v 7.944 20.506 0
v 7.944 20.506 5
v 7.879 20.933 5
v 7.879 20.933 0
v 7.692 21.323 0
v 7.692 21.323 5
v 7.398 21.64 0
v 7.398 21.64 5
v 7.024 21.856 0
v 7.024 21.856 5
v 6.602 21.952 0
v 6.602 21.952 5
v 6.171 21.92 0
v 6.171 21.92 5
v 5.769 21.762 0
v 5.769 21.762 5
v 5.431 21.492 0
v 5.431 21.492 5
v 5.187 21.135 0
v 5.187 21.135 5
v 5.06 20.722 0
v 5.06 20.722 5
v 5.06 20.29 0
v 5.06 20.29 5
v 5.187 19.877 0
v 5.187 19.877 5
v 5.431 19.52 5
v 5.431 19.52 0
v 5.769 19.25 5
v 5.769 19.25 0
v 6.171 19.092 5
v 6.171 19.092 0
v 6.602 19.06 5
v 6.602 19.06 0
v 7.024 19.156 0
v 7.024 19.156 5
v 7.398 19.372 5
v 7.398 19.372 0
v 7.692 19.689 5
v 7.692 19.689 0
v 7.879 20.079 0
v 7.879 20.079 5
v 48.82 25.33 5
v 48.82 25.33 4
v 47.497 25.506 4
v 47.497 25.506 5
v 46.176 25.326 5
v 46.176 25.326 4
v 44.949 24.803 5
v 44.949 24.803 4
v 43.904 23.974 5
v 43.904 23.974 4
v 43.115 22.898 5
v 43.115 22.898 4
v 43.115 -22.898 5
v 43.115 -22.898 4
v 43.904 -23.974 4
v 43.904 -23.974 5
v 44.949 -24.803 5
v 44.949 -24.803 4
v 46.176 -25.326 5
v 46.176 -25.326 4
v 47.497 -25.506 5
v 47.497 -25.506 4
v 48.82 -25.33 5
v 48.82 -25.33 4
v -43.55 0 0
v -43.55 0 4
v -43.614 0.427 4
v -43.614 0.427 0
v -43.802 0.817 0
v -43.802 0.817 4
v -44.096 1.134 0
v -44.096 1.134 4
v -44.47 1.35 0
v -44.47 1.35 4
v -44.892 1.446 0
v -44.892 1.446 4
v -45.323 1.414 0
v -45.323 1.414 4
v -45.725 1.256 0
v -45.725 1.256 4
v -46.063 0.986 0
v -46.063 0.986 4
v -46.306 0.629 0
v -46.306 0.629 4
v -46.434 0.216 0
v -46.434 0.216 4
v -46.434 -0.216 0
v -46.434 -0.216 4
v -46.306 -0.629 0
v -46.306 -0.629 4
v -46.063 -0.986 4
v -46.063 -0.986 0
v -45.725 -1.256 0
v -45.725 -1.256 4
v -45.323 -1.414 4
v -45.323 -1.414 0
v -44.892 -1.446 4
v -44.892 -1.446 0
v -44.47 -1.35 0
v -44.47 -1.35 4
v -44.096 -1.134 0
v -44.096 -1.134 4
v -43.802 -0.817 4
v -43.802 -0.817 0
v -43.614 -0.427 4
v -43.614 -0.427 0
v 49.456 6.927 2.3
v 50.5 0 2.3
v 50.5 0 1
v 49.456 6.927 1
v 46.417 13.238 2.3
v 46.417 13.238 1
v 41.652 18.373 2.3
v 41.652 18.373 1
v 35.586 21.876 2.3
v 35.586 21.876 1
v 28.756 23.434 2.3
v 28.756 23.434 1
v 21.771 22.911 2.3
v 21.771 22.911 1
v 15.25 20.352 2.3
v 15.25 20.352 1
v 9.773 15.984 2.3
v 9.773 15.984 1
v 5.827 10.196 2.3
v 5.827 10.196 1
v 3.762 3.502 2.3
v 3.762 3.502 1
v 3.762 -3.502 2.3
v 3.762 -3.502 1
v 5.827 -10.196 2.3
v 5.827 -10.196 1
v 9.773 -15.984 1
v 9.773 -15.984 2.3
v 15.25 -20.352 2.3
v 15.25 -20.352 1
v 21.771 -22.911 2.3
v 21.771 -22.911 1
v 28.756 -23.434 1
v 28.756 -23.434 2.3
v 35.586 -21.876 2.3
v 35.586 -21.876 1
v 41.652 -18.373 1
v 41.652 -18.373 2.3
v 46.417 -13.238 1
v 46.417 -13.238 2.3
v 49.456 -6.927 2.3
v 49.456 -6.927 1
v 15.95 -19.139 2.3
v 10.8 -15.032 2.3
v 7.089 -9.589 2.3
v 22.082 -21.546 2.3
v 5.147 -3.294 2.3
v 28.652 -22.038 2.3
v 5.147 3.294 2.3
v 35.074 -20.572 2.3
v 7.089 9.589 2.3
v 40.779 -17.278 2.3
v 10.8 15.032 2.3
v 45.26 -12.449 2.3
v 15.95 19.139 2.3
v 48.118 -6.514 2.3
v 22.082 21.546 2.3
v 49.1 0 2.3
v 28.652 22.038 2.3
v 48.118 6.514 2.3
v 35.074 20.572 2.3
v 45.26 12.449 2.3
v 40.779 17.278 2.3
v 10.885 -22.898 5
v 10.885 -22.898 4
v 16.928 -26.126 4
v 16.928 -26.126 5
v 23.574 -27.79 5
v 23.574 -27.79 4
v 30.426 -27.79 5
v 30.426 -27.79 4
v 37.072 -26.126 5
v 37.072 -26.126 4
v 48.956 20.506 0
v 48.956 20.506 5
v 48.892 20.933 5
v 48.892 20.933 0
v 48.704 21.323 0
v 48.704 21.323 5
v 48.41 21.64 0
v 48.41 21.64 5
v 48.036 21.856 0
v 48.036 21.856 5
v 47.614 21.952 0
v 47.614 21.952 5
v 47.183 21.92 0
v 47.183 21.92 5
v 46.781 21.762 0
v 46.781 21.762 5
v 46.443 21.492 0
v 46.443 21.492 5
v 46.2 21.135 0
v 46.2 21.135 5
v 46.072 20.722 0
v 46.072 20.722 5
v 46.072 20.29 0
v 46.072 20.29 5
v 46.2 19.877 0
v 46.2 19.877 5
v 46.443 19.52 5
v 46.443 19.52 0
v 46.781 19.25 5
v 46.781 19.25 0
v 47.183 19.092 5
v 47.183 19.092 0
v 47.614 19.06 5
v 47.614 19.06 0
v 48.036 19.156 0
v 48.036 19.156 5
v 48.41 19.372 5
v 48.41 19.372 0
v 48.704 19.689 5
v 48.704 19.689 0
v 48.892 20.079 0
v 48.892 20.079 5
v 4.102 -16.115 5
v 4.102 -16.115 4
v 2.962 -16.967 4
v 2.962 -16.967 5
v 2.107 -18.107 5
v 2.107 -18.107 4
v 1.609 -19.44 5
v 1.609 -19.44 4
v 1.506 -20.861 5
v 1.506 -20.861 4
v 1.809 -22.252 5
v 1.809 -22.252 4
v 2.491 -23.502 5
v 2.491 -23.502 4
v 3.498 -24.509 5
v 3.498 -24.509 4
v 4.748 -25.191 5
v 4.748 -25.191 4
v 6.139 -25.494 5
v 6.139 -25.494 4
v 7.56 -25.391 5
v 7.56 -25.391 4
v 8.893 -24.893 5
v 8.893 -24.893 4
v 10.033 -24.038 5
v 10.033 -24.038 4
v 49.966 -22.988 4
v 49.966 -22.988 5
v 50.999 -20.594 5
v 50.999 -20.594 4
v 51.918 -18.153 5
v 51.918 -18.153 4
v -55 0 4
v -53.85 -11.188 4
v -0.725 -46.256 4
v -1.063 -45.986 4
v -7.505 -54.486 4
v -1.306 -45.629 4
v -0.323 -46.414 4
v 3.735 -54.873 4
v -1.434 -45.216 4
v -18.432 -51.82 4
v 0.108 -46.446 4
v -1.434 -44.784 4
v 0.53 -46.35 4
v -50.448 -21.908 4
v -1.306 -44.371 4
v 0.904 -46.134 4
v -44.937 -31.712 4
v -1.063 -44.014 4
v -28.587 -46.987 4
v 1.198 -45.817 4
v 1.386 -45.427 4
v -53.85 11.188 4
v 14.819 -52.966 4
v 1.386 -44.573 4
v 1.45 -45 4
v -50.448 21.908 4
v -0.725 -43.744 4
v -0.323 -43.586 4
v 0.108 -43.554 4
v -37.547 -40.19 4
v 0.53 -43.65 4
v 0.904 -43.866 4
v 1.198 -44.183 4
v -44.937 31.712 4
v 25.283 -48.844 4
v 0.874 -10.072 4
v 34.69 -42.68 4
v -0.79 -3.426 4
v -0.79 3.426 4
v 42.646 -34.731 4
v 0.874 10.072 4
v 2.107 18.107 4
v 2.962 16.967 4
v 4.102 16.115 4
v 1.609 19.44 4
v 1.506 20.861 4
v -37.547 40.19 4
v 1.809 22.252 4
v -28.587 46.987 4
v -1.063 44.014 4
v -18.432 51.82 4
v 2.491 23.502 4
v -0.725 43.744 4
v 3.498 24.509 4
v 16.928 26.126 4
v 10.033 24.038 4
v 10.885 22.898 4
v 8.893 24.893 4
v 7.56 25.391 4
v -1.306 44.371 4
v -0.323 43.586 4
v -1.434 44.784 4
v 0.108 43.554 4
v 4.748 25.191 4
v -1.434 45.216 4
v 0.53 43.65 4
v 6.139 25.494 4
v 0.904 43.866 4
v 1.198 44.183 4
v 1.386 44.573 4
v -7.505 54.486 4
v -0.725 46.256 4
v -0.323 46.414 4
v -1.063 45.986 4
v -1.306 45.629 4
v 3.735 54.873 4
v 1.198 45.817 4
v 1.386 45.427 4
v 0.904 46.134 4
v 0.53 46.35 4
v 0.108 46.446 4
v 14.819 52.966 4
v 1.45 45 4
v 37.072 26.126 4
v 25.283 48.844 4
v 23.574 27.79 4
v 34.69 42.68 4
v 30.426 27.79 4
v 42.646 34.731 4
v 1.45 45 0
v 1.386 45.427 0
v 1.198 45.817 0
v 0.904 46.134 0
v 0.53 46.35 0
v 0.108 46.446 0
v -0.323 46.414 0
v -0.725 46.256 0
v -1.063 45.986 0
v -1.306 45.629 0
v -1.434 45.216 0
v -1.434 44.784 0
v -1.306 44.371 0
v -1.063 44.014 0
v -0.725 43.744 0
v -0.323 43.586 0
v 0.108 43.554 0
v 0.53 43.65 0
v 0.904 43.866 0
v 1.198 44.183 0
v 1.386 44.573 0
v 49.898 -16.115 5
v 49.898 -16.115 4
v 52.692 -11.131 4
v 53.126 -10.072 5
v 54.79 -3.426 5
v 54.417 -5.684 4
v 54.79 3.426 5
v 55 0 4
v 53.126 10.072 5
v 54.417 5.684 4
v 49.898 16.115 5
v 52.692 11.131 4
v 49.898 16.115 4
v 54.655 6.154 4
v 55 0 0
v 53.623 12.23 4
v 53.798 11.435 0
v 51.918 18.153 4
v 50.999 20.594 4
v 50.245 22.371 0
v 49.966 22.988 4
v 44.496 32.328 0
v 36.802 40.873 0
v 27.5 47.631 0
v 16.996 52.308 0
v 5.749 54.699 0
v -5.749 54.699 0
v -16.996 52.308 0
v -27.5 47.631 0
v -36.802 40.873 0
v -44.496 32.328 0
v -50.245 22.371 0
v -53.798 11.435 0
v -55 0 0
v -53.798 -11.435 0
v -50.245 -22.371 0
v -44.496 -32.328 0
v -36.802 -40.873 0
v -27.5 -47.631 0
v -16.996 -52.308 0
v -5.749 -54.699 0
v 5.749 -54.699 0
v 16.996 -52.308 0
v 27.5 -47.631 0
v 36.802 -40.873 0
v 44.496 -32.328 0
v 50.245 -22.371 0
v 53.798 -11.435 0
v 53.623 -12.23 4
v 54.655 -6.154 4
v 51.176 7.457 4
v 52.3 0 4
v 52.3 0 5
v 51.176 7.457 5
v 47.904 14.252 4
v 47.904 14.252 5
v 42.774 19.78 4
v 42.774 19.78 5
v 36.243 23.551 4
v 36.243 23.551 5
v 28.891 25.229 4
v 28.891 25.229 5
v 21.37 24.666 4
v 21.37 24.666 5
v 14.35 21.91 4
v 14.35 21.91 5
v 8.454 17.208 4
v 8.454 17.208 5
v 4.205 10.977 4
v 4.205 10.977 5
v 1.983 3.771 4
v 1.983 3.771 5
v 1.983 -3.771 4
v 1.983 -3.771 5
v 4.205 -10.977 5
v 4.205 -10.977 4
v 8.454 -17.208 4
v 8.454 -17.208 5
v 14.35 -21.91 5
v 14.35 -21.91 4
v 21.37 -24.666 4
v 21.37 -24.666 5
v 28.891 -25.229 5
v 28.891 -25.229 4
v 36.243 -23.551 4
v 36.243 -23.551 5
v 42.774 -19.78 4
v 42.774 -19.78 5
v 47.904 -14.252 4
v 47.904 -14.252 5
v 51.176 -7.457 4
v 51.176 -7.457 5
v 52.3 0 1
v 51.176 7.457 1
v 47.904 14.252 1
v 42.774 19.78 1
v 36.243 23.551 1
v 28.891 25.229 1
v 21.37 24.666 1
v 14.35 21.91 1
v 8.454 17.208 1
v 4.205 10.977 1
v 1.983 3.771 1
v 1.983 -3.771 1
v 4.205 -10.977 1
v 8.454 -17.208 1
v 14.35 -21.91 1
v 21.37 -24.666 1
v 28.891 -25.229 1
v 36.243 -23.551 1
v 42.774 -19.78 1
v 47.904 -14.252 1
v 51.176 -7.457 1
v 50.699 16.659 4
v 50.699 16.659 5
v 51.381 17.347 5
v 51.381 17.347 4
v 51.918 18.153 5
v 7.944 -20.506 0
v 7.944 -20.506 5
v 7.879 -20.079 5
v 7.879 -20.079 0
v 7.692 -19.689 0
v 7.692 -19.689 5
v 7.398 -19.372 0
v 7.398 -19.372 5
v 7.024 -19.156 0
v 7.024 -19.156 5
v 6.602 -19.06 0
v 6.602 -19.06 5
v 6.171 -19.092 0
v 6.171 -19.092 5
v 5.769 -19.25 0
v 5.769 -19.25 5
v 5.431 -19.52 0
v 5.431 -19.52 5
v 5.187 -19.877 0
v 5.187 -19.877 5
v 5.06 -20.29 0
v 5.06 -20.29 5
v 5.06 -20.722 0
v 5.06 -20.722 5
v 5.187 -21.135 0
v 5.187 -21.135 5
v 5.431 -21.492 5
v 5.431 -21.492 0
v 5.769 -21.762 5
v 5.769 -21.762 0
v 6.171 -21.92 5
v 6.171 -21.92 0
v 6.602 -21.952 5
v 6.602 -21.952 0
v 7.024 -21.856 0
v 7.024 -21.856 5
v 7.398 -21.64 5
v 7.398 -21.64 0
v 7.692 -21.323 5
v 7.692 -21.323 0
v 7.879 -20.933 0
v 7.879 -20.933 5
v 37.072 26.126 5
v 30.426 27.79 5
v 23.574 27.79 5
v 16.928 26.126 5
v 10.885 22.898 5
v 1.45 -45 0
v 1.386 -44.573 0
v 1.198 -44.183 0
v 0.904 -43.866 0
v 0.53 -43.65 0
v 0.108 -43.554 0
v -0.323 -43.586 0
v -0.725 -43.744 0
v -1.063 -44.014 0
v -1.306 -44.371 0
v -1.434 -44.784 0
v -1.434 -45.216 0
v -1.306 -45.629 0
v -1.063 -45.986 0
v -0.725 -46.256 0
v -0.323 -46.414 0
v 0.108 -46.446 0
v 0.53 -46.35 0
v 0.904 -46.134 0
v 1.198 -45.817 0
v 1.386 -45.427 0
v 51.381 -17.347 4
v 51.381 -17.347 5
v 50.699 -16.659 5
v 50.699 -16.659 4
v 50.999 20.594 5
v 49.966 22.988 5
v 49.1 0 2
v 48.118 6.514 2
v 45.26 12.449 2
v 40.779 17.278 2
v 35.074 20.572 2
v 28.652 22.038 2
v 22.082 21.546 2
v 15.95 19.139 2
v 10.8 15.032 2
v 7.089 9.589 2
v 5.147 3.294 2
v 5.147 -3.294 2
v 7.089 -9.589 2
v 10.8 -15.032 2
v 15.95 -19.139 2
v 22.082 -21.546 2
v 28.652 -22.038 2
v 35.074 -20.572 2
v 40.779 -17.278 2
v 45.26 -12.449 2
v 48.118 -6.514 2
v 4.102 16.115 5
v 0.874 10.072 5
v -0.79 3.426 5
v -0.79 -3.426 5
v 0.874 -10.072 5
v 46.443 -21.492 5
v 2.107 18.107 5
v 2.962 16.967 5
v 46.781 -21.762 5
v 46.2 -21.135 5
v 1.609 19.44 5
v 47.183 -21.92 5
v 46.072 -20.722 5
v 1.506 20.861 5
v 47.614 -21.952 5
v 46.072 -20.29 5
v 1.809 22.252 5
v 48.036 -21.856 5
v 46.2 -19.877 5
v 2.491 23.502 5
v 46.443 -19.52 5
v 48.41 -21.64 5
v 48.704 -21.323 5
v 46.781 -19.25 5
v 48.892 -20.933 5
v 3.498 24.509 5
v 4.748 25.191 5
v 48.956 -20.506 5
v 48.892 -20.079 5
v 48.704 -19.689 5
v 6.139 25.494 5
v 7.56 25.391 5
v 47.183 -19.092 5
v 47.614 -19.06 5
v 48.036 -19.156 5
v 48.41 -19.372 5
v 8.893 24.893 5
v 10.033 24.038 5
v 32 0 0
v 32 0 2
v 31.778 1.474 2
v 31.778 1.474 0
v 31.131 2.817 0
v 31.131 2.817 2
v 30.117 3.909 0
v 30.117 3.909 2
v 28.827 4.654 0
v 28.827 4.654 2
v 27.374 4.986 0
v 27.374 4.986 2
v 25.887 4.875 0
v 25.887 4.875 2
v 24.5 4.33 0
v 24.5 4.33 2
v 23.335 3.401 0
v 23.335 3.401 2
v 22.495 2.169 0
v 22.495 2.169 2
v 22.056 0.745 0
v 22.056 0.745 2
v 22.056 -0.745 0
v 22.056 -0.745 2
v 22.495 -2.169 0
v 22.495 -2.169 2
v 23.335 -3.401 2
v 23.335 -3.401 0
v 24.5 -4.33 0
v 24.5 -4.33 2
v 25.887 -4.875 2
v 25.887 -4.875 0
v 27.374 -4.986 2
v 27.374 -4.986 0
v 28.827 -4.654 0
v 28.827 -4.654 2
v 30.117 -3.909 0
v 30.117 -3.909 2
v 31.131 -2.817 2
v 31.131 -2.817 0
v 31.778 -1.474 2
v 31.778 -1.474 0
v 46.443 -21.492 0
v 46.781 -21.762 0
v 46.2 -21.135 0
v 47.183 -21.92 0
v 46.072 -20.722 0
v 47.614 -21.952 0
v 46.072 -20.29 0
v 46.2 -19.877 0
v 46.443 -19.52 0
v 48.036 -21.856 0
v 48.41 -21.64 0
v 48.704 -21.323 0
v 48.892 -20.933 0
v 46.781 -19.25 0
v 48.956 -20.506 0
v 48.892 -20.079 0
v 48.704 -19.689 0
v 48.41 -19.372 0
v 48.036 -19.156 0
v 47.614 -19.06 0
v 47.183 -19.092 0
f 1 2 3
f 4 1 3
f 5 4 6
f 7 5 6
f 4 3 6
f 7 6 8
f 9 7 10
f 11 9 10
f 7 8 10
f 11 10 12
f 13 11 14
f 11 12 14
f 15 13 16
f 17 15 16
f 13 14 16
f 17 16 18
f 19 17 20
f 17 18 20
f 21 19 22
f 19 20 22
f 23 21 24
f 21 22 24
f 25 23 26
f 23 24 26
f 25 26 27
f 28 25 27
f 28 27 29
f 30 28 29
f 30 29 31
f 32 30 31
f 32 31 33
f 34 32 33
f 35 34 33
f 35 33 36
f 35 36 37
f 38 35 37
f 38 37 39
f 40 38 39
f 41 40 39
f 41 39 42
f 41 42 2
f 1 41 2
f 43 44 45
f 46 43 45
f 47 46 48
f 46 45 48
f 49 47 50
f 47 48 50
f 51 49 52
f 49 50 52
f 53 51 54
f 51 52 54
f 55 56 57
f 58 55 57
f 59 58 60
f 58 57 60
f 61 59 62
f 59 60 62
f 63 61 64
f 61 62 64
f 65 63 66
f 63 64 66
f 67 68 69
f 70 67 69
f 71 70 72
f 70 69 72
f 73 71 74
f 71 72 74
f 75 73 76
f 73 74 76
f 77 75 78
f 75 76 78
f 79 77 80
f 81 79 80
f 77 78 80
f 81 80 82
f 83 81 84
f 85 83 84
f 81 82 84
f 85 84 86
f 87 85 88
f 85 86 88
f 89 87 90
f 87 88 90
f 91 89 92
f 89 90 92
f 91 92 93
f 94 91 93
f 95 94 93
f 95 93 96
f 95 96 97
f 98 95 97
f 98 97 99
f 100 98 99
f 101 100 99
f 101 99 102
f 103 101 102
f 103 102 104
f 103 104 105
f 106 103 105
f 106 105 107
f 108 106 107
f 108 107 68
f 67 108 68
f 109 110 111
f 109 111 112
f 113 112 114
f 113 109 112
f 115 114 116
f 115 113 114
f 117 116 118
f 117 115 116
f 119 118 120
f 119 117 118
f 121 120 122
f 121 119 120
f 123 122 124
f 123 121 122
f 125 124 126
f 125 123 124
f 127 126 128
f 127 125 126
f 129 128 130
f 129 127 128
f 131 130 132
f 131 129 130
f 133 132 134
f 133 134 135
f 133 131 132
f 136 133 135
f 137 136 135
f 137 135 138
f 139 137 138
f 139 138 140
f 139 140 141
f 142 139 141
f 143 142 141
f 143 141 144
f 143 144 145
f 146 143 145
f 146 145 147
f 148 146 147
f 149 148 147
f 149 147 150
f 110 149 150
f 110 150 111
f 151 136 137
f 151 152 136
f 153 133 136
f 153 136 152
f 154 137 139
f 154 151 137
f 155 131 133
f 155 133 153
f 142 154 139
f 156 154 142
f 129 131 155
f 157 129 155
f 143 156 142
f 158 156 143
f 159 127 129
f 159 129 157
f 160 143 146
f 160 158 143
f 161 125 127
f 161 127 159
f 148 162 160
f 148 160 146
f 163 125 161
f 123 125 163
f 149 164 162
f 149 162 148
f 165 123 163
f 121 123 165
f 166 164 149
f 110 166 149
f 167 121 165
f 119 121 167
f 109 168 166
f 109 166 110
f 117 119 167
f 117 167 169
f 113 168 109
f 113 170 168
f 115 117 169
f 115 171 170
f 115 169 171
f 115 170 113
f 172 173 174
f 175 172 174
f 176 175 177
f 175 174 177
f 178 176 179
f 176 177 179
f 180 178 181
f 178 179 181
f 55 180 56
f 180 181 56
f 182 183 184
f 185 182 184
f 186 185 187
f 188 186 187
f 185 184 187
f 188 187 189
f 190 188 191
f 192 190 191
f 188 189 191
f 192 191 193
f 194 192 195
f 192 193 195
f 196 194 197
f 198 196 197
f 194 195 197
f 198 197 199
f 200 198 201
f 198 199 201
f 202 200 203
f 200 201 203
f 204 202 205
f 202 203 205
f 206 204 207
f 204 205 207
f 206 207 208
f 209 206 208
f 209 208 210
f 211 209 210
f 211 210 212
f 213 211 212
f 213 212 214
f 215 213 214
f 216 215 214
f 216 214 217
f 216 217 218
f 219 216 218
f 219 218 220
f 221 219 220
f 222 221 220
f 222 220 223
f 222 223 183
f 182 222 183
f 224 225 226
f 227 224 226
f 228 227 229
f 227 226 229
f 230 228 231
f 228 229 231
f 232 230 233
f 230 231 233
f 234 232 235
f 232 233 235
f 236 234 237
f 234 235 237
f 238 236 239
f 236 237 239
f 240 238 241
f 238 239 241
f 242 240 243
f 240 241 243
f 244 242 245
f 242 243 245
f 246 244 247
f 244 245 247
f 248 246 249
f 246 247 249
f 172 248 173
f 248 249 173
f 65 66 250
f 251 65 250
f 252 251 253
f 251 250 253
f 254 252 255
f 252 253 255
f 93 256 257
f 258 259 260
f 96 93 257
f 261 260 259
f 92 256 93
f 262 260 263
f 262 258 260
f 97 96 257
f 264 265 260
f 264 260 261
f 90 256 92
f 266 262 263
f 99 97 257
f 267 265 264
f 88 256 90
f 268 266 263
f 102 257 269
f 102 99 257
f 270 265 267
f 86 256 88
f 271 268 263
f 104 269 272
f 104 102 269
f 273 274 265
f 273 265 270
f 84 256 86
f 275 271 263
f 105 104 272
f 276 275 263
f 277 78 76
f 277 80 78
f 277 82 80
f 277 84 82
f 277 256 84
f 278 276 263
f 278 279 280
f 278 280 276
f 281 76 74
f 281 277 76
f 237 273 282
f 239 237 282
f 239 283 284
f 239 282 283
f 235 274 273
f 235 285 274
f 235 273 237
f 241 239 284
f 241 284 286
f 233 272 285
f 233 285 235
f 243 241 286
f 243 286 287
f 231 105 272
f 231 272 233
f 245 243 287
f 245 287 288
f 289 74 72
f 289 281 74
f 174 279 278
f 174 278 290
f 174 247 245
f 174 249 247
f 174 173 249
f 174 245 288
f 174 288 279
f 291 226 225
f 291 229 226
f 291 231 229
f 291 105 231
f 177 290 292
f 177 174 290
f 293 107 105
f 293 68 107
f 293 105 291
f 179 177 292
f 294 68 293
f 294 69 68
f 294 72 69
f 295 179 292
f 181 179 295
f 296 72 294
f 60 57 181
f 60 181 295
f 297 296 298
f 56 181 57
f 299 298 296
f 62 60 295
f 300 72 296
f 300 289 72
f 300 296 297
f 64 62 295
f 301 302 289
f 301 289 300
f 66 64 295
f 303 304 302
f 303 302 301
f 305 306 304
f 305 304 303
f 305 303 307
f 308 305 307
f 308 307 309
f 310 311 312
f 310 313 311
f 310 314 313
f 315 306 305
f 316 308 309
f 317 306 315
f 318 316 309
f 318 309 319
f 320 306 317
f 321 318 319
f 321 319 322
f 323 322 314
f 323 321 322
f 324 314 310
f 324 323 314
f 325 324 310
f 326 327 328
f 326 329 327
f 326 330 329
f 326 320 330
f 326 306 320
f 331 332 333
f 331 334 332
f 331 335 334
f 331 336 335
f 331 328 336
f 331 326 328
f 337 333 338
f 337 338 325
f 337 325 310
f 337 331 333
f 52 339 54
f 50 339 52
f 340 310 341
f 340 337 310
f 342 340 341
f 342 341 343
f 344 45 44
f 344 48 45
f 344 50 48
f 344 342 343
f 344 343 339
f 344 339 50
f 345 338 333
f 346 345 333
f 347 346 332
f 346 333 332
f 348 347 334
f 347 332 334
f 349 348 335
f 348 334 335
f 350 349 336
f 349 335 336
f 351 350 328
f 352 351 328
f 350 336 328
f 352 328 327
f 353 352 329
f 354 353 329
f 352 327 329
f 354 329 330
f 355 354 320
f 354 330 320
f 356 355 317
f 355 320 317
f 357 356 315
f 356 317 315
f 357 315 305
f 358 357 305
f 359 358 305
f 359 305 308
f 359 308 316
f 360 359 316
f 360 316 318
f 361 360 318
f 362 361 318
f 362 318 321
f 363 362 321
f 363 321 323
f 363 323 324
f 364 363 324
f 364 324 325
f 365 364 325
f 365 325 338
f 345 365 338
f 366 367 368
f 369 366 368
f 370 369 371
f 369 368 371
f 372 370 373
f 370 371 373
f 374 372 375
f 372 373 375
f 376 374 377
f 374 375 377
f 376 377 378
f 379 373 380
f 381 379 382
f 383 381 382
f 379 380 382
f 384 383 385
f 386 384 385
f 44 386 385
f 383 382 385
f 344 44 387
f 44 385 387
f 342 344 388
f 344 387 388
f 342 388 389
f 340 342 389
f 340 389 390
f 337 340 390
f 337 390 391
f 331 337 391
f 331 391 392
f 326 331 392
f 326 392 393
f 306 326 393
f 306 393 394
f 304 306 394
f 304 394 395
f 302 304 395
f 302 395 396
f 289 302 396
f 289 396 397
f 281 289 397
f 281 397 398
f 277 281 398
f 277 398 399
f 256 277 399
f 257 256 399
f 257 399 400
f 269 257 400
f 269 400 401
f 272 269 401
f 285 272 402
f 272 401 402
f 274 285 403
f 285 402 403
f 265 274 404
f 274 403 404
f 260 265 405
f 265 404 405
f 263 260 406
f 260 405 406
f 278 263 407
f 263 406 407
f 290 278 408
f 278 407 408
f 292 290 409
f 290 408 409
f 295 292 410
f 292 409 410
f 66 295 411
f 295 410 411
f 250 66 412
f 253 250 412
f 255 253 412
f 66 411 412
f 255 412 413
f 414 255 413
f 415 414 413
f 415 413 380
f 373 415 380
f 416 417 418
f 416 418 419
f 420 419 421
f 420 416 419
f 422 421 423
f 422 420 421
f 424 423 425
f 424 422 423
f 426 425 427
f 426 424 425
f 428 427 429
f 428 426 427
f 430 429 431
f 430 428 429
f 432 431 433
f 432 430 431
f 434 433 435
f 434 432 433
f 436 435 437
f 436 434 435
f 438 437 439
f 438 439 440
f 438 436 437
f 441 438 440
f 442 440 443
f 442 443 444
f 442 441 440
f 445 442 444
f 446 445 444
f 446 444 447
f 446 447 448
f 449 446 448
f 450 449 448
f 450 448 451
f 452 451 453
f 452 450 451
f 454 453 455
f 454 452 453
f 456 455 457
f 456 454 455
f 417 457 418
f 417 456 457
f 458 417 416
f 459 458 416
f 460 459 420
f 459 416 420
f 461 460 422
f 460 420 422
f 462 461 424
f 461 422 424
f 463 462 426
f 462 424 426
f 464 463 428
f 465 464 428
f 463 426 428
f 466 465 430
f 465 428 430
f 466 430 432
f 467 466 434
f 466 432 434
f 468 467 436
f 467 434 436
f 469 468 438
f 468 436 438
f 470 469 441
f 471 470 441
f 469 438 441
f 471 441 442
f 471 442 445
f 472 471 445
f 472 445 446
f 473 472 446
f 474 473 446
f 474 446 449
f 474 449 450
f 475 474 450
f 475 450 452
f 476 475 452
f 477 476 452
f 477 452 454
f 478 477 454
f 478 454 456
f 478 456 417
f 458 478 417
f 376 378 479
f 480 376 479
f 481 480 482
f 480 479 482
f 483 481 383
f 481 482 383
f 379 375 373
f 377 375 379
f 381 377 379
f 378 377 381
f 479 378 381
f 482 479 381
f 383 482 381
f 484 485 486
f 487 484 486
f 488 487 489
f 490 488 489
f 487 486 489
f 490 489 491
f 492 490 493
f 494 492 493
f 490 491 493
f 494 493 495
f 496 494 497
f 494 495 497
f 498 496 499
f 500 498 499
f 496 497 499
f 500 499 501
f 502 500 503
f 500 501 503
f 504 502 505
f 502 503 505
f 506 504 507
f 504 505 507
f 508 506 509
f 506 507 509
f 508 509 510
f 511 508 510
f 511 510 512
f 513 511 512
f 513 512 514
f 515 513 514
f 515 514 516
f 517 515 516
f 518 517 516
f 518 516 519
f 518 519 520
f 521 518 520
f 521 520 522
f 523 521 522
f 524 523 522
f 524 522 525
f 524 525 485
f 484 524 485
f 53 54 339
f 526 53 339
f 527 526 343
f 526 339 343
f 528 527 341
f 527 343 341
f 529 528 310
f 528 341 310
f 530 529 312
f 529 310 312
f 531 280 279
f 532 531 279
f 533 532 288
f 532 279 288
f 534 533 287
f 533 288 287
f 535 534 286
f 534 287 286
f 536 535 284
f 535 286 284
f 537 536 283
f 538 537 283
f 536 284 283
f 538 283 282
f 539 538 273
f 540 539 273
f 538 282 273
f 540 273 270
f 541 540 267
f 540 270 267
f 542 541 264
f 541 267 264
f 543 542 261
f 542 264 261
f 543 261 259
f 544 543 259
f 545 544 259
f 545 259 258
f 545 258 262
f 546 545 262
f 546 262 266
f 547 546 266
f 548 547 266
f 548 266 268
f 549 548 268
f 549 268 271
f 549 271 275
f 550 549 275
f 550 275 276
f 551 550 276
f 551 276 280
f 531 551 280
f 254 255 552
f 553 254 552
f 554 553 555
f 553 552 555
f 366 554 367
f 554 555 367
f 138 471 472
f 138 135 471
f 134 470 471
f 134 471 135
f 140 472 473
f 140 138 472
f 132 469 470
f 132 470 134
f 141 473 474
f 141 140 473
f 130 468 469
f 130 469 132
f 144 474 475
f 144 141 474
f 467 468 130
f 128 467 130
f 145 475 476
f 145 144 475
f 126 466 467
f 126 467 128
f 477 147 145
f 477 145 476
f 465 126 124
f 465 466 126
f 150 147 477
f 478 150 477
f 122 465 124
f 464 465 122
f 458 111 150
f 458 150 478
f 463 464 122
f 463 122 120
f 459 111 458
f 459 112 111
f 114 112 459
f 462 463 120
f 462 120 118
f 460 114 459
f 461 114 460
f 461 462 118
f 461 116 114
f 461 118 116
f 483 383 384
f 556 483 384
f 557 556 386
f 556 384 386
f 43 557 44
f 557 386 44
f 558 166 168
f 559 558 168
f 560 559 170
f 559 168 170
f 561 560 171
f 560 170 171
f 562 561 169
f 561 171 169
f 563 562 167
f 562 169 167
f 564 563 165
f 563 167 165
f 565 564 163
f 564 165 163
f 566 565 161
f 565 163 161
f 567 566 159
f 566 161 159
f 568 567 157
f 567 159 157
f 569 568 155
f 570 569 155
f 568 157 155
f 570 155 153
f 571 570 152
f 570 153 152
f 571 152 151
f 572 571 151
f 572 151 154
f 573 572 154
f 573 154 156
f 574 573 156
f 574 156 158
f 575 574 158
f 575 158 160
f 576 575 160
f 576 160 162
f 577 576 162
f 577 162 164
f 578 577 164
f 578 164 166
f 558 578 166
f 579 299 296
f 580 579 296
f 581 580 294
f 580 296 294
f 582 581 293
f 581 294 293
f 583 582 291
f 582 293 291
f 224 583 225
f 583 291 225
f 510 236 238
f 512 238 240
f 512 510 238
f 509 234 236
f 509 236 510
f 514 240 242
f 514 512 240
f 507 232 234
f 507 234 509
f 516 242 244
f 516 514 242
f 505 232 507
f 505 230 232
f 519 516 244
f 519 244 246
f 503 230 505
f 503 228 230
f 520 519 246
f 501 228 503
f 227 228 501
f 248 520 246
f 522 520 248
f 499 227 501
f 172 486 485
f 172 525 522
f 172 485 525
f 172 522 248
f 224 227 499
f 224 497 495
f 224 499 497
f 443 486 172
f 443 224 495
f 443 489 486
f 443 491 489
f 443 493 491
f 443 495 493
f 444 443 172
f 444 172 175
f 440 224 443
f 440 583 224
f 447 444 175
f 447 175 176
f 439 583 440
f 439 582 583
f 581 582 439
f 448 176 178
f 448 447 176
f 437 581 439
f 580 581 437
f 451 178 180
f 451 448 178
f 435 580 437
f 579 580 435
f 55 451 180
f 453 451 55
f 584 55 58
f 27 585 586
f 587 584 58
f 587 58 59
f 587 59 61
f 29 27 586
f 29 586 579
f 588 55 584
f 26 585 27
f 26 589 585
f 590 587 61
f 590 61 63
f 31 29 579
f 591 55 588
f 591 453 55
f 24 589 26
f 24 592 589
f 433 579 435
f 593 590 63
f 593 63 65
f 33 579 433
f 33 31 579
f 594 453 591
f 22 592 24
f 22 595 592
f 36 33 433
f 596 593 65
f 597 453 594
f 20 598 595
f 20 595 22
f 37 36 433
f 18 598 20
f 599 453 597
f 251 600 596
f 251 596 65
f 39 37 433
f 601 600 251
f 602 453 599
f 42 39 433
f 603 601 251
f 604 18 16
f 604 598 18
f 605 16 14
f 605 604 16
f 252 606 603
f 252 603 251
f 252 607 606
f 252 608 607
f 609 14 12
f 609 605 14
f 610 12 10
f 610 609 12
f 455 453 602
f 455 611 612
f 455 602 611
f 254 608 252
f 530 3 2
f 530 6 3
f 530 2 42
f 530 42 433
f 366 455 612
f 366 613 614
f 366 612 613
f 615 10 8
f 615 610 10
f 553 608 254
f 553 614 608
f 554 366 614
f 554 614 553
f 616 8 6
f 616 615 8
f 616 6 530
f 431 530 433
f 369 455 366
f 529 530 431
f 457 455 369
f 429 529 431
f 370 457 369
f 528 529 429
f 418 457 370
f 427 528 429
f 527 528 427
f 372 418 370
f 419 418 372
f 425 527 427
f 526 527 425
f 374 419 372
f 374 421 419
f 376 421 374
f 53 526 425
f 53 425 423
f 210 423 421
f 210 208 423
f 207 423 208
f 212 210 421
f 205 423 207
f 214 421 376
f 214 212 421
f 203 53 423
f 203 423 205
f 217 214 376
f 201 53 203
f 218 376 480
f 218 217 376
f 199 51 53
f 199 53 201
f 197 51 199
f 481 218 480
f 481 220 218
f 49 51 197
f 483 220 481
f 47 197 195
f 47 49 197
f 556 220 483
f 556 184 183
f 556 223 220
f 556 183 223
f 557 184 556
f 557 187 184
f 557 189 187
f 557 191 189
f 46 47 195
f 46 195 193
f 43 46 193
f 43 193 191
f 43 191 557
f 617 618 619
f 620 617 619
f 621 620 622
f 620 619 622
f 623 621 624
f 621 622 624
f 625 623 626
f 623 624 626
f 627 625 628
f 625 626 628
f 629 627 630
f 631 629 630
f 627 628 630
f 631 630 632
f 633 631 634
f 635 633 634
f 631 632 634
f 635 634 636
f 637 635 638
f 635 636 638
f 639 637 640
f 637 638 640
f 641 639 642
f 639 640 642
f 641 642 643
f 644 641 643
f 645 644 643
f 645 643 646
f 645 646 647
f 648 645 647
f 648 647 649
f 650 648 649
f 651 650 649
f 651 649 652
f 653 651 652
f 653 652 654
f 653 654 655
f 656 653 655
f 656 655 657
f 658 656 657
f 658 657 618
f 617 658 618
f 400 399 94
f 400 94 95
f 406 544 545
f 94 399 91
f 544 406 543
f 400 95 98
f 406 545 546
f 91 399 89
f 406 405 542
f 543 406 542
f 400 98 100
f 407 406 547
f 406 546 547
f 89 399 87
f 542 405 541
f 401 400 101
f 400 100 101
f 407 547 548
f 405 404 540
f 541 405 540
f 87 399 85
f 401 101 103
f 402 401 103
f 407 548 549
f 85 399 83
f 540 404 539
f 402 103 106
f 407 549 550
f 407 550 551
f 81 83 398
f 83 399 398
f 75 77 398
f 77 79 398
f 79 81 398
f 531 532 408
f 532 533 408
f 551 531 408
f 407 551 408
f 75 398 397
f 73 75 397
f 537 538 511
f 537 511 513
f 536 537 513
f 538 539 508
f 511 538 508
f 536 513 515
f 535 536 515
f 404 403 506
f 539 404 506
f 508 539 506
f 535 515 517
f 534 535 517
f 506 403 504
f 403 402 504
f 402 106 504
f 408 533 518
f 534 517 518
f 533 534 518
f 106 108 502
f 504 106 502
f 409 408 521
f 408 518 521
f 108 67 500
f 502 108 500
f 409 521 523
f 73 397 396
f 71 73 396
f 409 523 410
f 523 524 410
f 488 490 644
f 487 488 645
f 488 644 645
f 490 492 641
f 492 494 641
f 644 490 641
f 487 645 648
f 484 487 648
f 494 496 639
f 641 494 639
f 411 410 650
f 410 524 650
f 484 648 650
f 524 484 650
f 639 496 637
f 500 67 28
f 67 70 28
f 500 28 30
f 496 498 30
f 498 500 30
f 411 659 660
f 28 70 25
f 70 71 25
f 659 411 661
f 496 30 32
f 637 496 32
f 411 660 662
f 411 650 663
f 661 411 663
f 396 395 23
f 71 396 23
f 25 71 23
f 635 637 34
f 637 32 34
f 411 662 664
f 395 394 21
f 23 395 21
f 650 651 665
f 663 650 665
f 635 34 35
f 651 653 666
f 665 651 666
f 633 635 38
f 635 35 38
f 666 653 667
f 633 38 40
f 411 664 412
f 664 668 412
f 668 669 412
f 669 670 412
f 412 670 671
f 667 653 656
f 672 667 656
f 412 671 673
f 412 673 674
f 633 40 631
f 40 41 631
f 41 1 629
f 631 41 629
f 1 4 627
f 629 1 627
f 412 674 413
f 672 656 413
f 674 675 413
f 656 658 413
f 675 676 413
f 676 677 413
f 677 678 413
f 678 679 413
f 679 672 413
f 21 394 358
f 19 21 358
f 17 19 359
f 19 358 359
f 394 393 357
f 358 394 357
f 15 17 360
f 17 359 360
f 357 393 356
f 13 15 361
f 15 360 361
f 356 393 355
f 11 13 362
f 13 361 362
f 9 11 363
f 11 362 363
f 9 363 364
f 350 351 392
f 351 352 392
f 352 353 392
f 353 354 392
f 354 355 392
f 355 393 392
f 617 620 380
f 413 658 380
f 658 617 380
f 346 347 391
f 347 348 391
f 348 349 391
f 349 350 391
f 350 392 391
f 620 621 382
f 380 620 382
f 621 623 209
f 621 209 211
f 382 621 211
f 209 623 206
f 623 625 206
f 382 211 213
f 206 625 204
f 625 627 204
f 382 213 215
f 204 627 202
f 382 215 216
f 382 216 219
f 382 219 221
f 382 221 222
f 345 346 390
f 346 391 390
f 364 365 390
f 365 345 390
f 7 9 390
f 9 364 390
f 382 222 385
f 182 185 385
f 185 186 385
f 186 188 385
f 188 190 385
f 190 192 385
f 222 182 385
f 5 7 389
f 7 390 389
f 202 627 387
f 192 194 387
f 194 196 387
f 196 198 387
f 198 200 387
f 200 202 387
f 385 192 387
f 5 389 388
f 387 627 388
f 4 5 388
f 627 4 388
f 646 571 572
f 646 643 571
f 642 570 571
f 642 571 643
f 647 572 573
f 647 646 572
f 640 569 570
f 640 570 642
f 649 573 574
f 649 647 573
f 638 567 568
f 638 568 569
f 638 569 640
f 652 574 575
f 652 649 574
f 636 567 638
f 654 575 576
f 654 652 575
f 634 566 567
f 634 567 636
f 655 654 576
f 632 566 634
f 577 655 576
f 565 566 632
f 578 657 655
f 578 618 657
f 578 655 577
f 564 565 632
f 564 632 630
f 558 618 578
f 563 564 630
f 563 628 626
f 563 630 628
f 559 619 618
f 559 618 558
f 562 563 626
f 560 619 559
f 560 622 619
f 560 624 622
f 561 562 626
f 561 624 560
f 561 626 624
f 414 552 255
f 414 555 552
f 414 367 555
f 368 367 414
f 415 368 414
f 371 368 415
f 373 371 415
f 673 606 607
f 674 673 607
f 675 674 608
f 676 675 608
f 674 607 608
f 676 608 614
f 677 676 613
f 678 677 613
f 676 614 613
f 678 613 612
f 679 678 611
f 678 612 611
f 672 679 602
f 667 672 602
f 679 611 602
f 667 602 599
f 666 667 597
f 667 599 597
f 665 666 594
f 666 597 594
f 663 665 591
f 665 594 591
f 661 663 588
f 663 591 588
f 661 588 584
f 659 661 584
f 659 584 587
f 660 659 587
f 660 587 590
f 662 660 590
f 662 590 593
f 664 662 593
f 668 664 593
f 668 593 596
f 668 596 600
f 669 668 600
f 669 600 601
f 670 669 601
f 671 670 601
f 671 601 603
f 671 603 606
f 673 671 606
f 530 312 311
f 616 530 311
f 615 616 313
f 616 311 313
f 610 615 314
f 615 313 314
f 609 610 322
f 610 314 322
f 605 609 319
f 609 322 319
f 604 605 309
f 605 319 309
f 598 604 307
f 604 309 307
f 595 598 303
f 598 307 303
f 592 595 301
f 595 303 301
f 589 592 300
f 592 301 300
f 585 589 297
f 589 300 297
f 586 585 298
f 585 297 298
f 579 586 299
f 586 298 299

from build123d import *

# Parameters (mm, degrees)
F0_R      = 55
F1_DEPTH  = 4
F2_R      = 22.1
F3_DEPTH  = 2
F4_R      = 25.3
F4_R_2    = 22.1
F5_DEPTH  = 1.5
F6_R      = 25.3
F6_R_2    = 23.5
F7_DEPTH  = 1.5
F8_DEPTH  = 0.2
F9_R      = 28
F9_R_2    = 25.3
F10_DEPTH = 1
F11_R     = 5
F12_DEPTH = 25
F14_DEPTH = 1
F15_R     = 1.45
F16_DEPTH = 25
F17_R     = 1.45
F18_DEPTH = 25


with BuildPart() as f1:
    # F0 (on Top) → F1 (new body)
    with BuildSketch(Plane.XY):
        Circle(F0_R)
    extrude(amount=F1_DEPTH)

    # F2 (on face) → F3 (cut)
    with BuildSketch(Plane.XY.offset(4)):
        with Locations((27, 0)):
            Circle(F2_R)
    extrude(amount=-F3_DEPTH, mode=Mode.SUBTRACT)

    # F4 (on face) → F5 (cut)
    with BuildSketch(Plane.XY.offset(4)):
        with Locations((27, 0)):
            Circle(F4_R)
        with Locations((27, 0)):
            Circle(F4_R_2, mode=Mode.SUBTRACT)
    extrude(amount=-F5_DEPTH, mode=Mode.SUBTRACT)

    # F6 (on face) → F7 (cut)
    with BuildSketch(Plane.XY.offset(2.5)):
        with Locations((27, 0)):
            Circle(F6_R)
        with Locations((27, 0)):
            Circle(F6_R_2, mode=Mode.SUBTRACT)
    extrude(amount=-F7_DEPTH, mode=Mode.SUBTRACT)

    # F8 (cut): a face of the model
    f8_faces = [f1.faces().sort_by_distance(p)[0] for p in [
        (4.1646803743, 0, 2.5),
    ]]
    extrude(f8_faces, amount=-F8_DEPTH, mode=Mode.SUBTRACT)

    # F9 (on face) → F10 (join)
    with BuildSketch(Plane.XY.offset(4)):
        with Locations((27, 0)):
            Circle(F9_R)
        with Locations((27, 0)):
            Circle(F9_R_2, mode=Mode.SUBTRACT)
    extrude(amount=F10_DEPTH)

    # F11 (on face) → F12 (cut)
    with BuildSketch(Plane.XY.offset(2)):
        with Locations((27, 0)):
            Circle(F11_R)
    extrude(amount=-F12_DEPTH, mode=Mode.SUBTRACT)

    # F13 (on face) → F14 (join)
    with BuildSketch(Plane.XY.offset(4)):
        with BuildLine():
            ThreePointArc((10.8848586854, -22.8976466129), (7.2010101268, -19.7989898732), (4.1023533871, -16.1151413146))
            ThreePointArc((4.1023533871, -16.1151413146), (2.9583694397, -24.0416305603), (10.8848586854, -22.8976466129))
        make_face()
        with BuildLine():
            ThreePointArc((10.8848586854, 22.8976466129), (2.9583694397, 24.0416305603), (4.1023533871, 16.1151413146))
            ThreePointArc((4.1023533871, 16.1151413146), (7.2010101268, 19.7989898732), (10.8848586854, 22.8976466129))
        make_face()
        with BuildLine():
            ThreePointArc((49.8976466129, -16.1151413146), (46.7989898732, -19.7989898732), (43.1151413146, -22.8976466129))
            ThreePointArc((43.1151413146, -22.8976466129), (45.5447053375, -25.105329645), (48.8197581332, -25.3304404978))
            ThreePointArc((48.8197581332, -25.3304404978), (50.4964850216, -21.7969034605), (51.917853321, -18.1531404043))
            ThreePointArc((51.917853321, -18.1531404043), (51.0570972643, -16.9860974117), (49.8976466129, -16.1151413146))
        make_face()
        with BuildLine():
            ThreePointArc((48.8197581332, 25.3304404978), (45.5447053375, 25.105329645), (43.1151413146, 22.8976466129))
            ThreePointArc((43.1151413146, 22.8976466129), (46.7989898732, 19.7989898732), (49.8976466129, 16.1151413146))
            ThreePointArc((49.8976466129, 16.1151413146), (51.0570972643, 16.9860974117), (51.917853321, 18.1531404043))
            ThreePointArc((51.917853321, 18.1531404043), (50.4964850216, 21.7969034605), (48.8197581332, 25.3304404978))
        make_face()
    extrude(amount=F14_DEPTH)

    # F15 (on face) → F16 (cut)
    with BuildSketch(Plane.XY.offset(5)):
        with Locations((6.4939033456, 20.5060966544)):
            Circle(F15_R)
        with Locations((47.5060966544, 20.5060966544)):
            Circle(F15_R)
        with Locations((47.5060966544, -20.5060966544)):
            Circle(F15_R)
        with Locations((6.4939033456, -20.5060966544)):
            Circle(F15_R)
    extrude(amount=-F16_DEPTH, mode=Mode.SUBTRACT)

    # F17 (on face) → F18 (cut)
    with BuildSketch(Plane.XY.offset(4)):
        with Locations((0, 45)):
            Circle(F17_R)
        with Locations((-45, 0)):
            Circle(F17_R)
        with Locations((0, -45)):
            Circle(F17_R)
    extrude(amount=-F18_DEPTH, mode=Mode.SUBTRACT)


solid = f1.part
